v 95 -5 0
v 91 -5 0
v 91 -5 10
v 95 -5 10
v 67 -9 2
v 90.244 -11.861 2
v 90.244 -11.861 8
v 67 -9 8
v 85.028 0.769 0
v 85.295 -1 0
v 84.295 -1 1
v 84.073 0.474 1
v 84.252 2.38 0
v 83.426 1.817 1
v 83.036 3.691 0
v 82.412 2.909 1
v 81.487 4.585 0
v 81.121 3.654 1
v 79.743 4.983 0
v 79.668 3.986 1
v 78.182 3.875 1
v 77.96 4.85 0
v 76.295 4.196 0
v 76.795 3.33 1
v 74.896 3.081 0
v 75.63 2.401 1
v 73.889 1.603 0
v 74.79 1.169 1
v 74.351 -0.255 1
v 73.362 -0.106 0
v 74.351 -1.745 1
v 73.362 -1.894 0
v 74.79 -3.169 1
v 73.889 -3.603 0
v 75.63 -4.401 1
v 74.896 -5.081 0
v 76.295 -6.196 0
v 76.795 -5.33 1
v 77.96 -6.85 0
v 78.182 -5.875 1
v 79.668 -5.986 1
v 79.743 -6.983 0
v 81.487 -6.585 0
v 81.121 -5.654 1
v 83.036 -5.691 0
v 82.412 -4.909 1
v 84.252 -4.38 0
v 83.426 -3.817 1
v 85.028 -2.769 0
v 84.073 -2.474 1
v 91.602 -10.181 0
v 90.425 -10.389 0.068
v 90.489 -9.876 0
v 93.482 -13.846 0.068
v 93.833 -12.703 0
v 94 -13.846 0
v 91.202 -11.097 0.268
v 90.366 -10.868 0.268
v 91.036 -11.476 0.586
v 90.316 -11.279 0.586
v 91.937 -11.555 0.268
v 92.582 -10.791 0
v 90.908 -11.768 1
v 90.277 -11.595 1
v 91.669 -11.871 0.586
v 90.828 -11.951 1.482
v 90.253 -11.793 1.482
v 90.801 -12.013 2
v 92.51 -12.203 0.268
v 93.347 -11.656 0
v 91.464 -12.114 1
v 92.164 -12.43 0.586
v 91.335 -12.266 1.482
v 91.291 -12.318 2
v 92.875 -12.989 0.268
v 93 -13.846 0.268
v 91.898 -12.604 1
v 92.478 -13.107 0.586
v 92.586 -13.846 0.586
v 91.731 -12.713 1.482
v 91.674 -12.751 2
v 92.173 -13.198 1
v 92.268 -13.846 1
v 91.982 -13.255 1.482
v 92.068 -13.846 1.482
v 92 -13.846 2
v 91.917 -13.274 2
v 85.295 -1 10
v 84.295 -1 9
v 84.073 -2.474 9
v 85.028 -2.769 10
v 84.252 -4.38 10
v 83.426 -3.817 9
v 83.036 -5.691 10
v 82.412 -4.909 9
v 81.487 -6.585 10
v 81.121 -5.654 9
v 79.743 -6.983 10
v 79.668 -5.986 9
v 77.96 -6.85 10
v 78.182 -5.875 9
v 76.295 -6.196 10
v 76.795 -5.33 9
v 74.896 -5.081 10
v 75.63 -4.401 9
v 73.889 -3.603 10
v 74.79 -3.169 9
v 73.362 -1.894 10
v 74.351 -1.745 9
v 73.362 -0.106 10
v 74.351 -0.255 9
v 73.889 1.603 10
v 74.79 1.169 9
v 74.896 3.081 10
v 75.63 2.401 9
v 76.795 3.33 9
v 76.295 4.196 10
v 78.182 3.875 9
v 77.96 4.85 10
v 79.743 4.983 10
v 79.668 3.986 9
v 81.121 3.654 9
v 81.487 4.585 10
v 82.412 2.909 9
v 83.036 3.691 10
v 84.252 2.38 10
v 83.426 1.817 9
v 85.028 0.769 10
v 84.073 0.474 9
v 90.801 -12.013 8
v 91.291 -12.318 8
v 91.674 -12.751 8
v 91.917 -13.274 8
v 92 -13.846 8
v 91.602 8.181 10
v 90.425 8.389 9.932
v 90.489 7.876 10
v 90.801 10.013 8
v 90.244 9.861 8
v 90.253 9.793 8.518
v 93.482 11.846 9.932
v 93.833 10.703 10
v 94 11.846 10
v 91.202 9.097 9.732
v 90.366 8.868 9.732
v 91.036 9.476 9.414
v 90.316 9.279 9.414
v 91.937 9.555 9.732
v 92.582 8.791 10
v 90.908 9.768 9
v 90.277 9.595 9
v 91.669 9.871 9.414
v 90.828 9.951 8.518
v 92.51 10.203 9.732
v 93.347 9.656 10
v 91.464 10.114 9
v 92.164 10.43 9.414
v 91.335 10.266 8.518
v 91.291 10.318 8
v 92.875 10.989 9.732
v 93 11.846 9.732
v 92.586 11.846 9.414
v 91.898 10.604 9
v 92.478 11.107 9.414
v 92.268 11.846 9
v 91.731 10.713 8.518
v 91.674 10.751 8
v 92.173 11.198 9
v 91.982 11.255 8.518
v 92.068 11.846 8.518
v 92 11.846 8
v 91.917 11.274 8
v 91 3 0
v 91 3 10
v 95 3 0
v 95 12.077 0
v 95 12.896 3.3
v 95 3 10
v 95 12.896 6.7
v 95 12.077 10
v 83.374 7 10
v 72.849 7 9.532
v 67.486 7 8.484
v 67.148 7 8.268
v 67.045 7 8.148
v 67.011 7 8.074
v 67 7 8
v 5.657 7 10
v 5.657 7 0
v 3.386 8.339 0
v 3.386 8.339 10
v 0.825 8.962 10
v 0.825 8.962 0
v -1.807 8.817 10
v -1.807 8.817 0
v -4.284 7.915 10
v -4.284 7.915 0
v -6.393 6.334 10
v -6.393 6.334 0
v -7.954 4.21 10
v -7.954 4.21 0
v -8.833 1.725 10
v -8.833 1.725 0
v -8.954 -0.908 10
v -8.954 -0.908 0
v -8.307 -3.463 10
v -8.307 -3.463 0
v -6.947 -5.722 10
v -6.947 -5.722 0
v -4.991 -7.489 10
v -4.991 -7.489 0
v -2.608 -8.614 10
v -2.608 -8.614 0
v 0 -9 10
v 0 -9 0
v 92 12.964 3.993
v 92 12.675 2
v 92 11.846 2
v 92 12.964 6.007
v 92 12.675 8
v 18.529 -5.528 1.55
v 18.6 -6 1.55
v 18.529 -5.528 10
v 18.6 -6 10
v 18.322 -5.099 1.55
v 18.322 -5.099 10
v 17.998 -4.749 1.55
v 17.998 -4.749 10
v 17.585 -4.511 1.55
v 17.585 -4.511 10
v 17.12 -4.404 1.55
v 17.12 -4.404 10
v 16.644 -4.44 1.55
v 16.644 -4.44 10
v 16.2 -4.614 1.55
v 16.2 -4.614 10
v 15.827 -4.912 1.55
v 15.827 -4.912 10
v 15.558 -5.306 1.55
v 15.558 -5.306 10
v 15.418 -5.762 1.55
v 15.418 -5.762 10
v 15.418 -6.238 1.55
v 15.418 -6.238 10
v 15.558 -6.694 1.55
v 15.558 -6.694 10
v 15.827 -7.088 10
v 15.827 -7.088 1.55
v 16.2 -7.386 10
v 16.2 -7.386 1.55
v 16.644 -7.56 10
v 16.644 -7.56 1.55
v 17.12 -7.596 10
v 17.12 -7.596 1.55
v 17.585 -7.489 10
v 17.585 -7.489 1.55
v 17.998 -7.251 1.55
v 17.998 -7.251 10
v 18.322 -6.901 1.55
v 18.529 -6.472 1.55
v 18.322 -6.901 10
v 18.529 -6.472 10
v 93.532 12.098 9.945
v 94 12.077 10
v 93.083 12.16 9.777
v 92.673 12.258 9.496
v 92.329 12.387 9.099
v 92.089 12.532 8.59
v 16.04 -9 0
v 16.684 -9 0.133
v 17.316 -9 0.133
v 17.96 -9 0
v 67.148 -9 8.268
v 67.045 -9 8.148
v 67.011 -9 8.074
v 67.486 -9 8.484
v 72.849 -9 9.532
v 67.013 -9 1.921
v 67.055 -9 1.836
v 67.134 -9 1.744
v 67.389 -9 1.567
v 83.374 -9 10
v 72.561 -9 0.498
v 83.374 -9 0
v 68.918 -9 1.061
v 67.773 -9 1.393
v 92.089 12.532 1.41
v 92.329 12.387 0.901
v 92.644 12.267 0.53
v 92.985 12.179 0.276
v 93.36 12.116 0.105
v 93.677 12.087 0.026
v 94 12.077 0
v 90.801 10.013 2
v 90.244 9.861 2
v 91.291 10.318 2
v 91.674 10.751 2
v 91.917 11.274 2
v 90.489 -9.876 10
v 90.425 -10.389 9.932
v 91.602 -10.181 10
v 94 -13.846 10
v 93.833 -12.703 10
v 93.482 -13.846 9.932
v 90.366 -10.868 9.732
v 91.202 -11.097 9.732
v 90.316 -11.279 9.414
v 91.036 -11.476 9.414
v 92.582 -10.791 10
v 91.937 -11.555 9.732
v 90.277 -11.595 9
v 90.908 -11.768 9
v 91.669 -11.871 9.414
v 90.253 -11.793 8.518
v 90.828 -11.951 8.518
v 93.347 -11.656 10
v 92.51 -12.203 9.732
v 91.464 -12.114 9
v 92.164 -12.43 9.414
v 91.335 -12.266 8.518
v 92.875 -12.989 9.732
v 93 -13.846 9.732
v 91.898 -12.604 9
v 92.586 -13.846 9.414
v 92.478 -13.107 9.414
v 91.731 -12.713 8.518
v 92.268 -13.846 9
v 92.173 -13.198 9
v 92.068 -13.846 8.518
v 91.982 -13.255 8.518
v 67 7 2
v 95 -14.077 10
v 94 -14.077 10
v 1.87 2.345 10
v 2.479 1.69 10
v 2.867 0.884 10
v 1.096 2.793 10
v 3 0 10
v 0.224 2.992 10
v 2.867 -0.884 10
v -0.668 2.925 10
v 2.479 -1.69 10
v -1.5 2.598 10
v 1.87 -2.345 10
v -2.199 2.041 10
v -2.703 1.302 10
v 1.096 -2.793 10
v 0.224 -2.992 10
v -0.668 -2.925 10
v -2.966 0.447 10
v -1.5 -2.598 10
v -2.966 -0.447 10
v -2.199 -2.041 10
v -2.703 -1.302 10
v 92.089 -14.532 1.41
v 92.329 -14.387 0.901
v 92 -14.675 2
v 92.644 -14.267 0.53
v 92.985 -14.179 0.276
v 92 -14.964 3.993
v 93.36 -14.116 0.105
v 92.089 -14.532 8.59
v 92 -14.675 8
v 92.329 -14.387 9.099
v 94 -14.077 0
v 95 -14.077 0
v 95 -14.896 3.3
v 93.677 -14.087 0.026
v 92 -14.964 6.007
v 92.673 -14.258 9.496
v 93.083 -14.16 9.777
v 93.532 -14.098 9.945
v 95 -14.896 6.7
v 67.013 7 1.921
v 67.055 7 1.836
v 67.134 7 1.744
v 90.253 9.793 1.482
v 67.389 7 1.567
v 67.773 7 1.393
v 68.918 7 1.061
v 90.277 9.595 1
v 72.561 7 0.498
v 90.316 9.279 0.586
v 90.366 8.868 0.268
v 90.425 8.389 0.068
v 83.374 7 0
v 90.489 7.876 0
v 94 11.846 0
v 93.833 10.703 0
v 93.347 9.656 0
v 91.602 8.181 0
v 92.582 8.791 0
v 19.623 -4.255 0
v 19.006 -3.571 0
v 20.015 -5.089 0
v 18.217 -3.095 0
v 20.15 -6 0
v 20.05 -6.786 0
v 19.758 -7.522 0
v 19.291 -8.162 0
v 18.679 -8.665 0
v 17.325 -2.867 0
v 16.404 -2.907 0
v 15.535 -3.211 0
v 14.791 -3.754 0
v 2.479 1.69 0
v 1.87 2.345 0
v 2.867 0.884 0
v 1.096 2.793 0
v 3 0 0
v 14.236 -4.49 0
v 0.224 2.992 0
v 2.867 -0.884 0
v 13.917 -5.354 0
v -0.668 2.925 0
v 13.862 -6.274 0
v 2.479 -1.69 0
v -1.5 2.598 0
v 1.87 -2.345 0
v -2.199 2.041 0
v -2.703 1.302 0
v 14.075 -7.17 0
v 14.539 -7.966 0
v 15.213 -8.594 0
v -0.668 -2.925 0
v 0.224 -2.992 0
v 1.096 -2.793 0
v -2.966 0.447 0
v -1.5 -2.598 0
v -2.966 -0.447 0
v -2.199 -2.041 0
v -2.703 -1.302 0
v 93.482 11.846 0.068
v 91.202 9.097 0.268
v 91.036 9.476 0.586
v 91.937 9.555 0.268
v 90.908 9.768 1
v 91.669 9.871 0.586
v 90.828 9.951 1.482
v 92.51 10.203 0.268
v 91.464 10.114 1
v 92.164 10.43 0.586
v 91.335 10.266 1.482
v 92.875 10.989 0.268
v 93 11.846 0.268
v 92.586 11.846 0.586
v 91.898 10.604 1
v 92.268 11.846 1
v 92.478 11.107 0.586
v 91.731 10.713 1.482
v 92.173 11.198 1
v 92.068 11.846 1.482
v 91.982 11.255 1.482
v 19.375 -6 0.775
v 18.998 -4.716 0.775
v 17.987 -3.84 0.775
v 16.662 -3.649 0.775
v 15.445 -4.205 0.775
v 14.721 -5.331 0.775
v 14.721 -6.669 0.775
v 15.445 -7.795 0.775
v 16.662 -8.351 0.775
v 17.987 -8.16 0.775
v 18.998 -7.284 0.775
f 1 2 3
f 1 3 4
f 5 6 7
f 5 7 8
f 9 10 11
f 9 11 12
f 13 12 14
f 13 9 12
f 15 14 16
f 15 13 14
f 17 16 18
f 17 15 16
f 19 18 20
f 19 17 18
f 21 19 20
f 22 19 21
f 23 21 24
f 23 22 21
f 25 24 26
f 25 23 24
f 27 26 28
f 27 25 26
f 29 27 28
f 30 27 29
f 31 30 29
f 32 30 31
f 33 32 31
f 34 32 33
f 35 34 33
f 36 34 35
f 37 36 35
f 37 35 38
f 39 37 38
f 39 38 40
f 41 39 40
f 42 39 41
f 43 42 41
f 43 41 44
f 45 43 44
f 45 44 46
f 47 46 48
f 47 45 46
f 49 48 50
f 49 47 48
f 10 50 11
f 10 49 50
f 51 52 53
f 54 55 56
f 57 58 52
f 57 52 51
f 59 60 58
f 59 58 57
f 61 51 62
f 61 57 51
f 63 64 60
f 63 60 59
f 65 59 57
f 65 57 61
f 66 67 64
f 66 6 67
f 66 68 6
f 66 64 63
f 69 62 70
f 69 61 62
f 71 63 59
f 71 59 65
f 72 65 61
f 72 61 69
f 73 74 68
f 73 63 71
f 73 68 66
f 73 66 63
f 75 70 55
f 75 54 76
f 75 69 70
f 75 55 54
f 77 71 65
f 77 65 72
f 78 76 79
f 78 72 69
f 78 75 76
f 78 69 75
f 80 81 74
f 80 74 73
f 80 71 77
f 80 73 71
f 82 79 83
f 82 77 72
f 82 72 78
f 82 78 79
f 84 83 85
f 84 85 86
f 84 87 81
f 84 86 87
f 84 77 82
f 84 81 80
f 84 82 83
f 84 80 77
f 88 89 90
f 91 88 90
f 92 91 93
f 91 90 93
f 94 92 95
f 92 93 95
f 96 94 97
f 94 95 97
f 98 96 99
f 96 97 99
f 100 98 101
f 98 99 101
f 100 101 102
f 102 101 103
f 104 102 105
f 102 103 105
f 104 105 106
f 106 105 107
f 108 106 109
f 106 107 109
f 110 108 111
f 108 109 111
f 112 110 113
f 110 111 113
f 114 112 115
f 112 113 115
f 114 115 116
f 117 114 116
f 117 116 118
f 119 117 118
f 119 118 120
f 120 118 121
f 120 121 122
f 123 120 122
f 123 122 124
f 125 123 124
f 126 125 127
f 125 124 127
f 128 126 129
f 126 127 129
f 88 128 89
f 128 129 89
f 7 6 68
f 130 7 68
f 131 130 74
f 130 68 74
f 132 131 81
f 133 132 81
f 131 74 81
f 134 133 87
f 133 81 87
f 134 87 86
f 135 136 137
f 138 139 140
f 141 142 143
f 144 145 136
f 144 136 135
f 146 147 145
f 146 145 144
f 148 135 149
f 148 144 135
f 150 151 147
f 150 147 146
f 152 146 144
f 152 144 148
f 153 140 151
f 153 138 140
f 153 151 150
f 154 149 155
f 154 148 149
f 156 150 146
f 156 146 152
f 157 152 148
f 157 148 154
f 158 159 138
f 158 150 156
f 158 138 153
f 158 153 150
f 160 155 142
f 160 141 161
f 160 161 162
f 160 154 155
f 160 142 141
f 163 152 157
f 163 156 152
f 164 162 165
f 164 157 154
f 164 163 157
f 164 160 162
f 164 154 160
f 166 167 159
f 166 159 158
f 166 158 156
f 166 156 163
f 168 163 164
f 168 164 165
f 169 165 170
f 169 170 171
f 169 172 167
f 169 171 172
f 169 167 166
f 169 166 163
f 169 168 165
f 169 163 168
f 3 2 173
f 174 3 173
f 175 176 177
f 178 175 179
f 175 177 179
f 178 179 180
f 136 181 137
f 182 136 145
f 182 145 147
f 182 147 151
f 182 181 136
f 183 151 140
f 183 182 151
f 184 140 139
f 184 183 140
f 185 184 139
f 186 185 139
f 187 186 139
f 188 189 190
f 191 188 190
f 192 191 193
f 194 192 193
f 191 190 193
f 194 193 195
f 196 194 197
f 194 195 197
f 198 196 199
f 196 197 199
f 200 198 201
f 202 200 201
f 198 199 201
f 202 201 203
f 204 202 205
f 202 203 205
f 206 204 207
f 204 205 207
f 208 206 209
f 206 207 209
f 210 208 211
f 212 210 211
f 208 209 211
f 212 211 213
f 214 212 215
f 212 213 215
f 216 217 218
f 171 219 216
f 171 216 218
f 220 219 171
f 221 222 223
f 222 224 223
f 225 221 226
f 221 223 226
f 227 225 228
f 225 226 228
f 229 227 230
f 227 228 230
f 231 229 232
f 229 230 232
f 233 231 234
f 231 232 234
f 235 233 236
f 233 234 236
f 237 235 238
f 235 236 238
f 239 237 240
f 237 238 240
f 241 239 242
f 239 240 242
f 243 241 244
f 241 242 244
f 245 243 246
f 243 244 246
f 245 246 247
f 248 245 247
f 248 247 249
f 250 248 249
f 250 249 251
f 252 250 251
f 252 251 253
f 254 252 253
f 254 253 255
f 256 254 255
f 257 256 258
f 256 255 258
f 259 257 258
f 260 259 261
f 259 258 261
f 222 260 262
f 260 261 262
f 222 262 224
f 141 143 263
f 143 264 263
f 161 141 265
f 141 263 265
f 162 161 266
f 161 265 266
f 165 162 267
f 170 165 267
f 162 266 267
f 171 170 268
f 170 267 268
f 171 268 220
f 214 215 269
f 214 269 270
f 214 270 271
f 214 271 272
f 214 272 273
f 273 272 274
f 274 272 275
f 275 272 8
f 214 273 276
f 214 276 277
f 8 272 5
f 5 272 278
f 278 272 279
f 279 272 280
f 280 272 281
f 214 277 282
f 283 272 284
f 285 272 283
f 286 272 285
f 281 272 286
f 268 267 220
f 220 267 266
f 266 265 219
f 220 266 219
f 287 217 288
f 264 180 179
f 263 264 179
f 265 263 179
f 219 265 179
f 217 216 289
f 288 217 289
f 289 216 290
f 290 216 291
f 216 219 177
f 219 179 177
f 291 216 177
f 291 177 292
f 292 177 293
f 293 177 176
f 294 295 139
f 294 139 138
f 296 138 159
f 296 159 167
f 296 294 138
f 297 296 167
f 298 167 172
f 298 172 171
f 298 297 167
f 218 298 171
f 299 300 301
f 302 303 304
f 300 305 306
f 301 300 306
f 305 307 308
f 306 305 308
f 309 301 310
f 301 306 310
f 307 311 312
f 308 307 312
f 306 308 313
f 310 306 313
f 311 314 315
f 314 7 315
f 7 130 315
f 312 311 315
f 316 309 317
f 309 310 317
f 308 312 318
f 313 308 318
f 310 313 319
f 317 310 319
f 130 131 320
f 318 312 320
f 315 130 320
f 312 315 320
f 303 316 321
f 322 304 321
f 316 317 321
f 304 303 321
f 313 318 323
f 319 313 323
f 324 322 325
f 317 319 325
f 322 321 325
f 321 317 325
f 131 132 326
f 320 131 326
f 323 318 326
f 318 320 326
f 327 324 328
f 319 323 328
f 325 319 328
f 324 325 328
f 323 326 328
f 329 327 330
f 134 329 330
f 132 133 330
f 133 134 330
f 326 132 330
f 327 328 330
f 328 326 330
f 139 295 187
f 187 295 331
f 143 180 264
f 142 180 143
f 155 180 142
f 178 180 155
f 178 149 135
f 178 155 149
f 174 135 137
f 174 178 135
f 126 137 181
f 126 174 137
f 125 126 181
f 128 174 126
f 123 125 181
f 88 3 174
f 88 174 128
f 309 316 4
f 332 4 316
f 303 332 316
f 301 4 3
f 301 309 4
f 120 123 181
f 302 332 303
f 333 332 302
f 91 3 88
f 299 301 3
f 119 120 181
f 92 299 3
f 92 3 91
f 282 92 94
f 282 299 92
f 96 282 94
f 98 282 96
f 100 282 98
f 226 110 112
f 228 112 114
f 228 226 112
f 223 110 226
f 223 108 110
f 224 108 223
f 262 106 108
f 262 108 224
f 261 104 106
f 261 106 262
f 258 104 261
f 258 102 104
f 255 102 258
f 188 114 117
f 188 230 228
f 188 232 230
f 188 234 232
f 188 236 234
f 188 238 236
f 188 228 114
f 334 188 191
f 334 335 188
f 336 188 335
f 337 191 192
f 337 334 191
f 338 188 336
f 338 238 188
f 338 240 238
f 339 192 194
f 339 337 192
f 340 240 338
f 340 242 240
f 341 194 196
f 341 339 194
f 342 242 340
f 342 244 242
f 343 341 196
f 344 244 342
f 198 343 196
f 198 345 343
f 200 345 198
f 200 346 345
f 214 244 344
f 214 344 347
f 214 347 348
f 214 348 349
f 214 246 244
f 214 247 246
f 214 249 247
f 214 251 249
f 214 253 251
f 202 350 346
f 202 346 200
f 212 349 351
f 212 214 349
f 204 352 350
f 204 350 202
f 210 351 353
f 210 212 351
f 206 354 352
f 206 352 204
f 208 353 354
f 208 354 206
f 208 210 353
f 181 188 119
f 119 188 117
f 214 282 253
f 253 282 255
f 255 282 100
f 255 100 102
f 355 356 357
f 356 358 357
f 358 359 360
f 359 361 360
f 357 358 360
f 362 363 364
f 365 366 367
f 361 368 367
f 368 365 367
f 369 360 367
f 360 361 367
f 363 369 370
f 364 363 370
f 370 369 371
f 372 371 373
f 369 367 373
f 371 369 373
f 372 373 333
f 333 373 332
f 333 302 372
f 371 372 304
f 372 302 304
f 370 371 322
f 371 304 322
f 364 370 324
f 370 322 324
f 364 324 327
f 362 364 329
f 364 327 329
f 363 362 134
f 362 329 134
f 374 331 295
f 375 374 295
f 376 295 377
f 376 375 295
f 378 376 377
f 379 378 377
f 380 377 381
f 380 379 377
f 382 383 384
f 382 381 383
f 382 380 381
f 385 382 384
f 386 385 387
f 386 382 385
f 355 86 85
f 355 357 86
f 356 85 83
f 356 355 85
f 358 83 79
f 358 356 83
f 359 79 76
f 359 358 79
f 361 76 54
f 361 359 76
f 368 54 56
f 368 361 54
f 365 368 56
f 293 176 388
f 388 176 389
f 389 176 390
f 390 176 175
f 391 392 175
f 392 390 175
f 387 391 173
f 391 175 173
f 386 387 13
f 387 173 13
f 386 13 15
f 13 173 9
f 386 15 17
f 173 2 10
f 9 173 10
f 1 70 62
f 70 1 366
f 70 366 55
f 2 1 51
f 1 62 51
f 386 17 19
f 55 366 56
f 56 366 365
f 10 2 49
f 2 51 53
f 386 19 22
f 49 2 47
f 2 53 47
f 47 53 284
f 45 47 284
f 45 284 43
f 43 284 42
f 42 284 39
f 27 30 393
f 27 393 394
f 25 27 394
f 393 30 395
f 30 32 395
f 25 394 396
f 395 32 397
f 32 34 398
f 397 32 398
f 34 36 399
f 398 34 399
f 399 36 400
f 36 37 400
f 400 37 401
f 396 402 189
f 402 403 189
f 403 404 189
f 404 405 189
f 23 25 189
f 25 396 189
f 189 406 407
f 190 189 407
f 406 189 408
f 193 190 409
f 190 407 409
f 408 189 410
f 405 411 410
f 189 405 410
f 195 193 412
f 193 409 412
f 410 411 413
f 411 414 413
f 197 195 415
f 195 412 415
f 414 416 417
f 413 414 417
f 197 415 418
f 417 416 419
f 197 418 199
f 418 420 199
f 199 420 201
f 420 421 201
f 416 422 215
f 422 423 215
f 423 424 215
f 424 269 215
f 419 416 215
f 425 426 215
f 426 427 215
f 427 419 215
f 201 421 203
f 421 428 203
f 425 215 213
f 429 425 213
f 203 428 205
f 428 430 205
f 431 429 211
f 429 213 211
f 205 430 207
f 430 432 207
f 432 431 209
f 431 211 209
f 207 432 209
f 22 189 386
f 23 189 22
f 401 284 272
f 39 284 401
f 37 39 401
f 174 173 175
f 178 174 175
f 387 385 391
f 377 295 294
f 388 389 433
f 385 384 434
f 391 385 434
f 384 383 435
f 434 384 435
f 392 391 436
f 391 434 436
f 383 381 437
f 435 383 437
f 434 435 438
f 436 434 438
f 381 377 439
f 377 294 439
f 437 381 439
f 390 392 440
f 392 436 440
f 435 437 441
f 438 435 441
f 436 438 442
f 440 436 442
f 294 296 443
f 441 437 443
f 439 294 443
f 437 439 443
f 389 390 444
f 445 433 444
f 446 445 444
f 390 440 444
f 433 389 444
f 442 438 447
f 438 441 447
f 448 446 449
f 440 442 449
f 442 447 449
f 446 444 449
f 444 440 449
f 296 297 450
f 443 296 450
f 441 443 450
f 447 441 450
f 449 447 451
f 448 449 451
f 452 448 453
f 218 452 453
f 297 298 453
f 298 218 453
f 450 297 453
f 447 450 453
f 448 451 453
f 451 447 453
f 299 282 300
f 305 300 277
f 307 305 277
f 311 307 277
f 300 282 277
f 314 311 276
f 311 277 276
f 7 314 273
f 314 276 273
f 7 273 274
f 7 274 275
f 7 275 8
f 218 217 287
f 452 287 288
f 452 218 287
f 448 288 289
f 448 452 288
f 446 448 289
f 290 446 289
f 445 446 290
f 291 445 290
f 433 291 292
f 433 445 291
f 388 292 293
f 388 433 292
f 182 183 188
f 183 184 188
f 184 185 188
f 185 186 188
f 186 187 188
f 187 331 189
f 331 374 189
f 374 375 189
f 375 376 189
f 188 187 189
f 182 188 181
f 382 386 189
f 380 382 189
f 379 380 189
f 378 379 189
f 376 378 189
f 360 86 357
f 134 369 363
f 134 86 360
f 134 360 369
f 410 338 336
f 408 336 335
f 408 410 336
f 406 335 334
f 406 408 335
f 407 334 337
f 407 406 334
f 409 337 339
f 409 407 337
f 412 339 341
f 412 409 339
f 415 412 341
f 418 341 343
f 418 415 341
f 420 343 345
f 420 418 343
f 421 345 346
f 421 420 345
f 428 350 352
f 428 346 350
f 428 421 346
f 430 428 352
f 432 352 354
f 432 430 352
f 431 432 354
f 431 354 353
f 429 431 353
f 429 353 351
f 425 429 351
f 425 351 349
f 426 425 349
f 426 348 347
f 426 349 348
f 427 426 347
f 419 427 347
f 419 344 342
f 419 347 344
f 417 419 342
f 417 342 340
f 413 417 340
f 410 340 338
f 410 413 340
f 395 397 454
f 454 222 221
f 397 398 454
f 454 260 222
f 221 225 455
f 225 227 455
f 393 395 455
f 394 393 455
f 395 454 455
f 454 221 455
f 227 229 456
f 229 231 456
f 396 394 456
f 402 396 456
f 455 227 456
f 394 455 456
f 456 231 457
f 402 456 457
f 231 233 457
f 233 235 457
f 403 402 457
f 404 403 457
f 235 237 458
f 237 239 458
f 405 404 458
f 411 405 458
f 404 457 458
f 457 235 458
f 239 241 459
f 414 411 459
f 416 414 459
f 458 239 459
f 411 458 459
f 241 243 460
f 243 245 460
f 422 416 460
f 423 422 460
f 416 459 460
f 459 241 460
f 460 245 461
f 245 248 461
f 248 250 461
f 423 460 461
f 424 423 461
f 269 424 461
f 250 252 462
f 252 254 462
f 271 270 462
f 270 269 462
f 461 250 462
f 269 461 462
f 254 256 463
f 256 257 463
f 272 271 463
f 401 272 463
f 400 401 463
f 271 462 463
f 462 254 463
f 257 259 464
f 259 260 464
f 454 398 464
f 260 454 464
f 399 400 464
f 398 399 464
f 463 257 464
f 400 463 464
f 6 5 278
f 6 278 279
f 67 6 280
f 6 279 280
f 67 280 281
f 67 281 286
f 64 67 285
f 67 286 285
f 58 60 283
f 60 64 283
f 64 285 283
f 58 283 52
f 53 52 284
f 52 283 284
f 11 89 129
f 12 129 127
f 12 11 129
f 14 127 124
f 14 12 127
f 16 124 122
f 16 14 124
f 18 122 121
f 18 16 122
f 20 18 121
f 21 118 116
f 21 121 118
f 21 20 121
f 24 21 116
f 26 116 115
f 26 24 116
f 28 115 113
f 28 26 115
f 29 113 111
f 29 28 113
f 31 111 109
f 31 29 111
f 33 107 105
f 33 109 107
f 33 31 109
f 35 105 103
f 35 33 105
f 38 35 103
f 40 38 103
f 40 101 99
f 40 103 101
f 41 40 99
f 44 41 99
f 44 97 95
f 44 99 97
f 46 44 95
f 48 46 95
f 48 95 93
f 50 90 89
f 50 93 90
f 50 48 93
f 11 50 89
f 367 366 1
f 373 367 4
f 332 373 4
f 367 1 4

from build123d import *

# Parameters (mm, degrees)
SKETCH1_R                                       = 9
BOSS_EXTRUDE1_DEPTH                             = 10
SKETCH2_R                                       = 3
CUT_EXTRUDE1_DEPTH                              = 96.94790253
BOSS_EXTRUDE2_DEPTH                             = 3
SKETCH3_W                                       = 4
SKETCH3_H                                       = 8
CUT_EXTRUDE2_DEPTH                              = 97.695398029
RIB4_REACH                                      = 98.695
SKETCH5_WALL_W                                  = 220.579405852
SKETCH5_WALL_H                                  = 10
FILLET1_R                                       = 2
FILLET1_OF_MIRROR1_R                            = 2
SKETCH7_R                                       = 5
CUT_EXTRUDE3_DEPTH                              = 97.695398153
CHAMFER1_SIZE                                   = 1
CSK_FOR_M3_FLAT_HEAD_MACHINE_SCREW1_D           = 3.2
CSK_FOR_M3_FLAT_HEAD_MACHINE_SCREW1_CSINK_D     = 6.3
CSK_FOR_M3_FLAT_HEAD_MACHINE_SCREW1_CSINK_ANGLE = 90


with BuildPart() as part:
    # Sketch1 → Boss-Extrude1 (new body)
    with BuildSketch(Plane.XY):
        Circle(SKETCH1_R)
        with BuildLine():
            ThreePointArc((9, 0), (6.363961031, -6.363961031), (0, -9))
            Line((0, -9), (95, -9))
            Line((95, -9), (95, 7))
            Line((95, 7), (5.656854249, 7))
            ThreePointArc((5.656854249, 7), (8.121320344, 3.878679656), (9, 0))
        make_face()
    extrude(amount=BOSS_EXTRUDE1_DEPTH)

    # Sketch2 → Cut-Extrude1 (cut, through all)
    with BuildSketch(Plane.XY):
        Circle(SKETCH2_R)
    extrude(amount=CUT_EXTRUDE1_DEPTH, mode=Mode.SUBTRACT)

    # Sketch4 → Boss-Extrude2 (add)
    with BuildSketch(Plane(origin=(95, 0, 0), x_dir=(0, 0, -1), z_dir=(1, 0, 0))):
        with BuildLine():
            ThreePointArc((0, -14.076696831), (-5, -15), (-10, -14.076696831))
            Line((-10, -14.076696831), (-10, 12.076696831))
            ThreePointArc((-10, 12.076696831), (-5, 13), (0, 12.076696831))
            Line((0, 12.076696831), (0, -14.076696831))
        make_face()
    extrude(amount=-BOSS_EXTRUDE2_DEPTH)

    # Sketch3 → Cut-Extrude2 (cut, through all)
    with BuildSketch(Plane.XY):
        with Locations((93, -1)):
            Rectangle(SKETCH3_W, SKETCH3_H)
    extrude(amount=CUT_EXTRUDE2_DEPTH, mode=Mode.SUBTRACT)

    # Sketch5 wall → Rib4 (add, up to next)
    with BuildSketch(Plane(origin=(79.5, 8.538348415, 10), x_dir=(-0.992512099864, -0.122146353295, 0), z_dir=(0.122146353295, -0.992512099864, 0)), mode=Mode.PRIVATE) as rib4_sk1:
        with Locations((0, 5)):
            Rectangle(SKETCH5_WALL_W, SKETCH5_WALL_H)
    rib4_tool1 = extrude(rib4_sk1.sketch, amount=RIB4_REACH, mode=Mode.PRIVATE) - part.part
    rib4 = rib4_tool1.solids().sort_by_distance((79.5, 8.538348415, 10))[0]
    add(rib4)

    # Fillet1
    fillet1_edges = [part.edges().sort_by_distance(p)[0] for p in [
        (92, 11.076696831, 0),
        (92, 11.076696831, 10),
        (92, 10.07669683, 5),
        (79.500000002, 8.538348415, 0),
        (79.500000002, 8.538348415, 10),
    ]]
    fillet(fillet1_edges, radius=FILLET1_R)

    # Mirror1: Rib4 across plane
    add(rib4.mirror(Plane.ZX.offset(-1)))

    # Fillet1 of Mirror1
    fillet1_of_mirror1_edges = [part.edges().sort_by_distance(p)[0] for p in [
        (92, -13.076696831, 0),
        (92, -13.076696831, 10),
        (92, -12.07669683, 5),
        (79.500000002, -10.538348415, 0),
        (79.500000002, -10.538348415, 10),
    ]]
    fillet(fillet1_of_mirror1_edges, radius=FILLET1_OF_MIRROR1_R)

    # Sketch7 → Cut-Extrude3 (cut, through all)
    with BuildSketch(Plane.XY):
        with Locations((79.294775575, -1)):
            Circle(SKETCH7_R)
    extrude(amount=CUT_EXTRUDE3_DEPTH, mode=Mode.SUBTRACT)

    # Chamfer1
    chamfer1_edges = [part.edges().sort_by_distance(p)[0] for p in [
        (74.294775575, -1, 0),
        (74.294775575, -1, 10),
    ]]
    chamfer(chamfer1_edges, length=CHAMFER1_SIZE)

    # CSK for M3 Flat Head Machine Screw1 (through all)
    with Locations(Plane(origin=(0, 0, 0), x_dir=(-1, 0, 0), z_dir=(0, 0, -1))):
        with Locations((-17, -6)):
            CounterSinkHole(CSK_FOR_M3_FLAT_HEAD_MACHINE_SCREW1_D / 2, CSK_FOR_M3_FLAT_HEAD_MACHINE_SCREW1_CSINK_D / 2, counter_sink_angle=CSK_FOR_M3_FLAT_HEAD_MACHINE_SCREW1_CSINK_ANGLE)


solid = part.part
